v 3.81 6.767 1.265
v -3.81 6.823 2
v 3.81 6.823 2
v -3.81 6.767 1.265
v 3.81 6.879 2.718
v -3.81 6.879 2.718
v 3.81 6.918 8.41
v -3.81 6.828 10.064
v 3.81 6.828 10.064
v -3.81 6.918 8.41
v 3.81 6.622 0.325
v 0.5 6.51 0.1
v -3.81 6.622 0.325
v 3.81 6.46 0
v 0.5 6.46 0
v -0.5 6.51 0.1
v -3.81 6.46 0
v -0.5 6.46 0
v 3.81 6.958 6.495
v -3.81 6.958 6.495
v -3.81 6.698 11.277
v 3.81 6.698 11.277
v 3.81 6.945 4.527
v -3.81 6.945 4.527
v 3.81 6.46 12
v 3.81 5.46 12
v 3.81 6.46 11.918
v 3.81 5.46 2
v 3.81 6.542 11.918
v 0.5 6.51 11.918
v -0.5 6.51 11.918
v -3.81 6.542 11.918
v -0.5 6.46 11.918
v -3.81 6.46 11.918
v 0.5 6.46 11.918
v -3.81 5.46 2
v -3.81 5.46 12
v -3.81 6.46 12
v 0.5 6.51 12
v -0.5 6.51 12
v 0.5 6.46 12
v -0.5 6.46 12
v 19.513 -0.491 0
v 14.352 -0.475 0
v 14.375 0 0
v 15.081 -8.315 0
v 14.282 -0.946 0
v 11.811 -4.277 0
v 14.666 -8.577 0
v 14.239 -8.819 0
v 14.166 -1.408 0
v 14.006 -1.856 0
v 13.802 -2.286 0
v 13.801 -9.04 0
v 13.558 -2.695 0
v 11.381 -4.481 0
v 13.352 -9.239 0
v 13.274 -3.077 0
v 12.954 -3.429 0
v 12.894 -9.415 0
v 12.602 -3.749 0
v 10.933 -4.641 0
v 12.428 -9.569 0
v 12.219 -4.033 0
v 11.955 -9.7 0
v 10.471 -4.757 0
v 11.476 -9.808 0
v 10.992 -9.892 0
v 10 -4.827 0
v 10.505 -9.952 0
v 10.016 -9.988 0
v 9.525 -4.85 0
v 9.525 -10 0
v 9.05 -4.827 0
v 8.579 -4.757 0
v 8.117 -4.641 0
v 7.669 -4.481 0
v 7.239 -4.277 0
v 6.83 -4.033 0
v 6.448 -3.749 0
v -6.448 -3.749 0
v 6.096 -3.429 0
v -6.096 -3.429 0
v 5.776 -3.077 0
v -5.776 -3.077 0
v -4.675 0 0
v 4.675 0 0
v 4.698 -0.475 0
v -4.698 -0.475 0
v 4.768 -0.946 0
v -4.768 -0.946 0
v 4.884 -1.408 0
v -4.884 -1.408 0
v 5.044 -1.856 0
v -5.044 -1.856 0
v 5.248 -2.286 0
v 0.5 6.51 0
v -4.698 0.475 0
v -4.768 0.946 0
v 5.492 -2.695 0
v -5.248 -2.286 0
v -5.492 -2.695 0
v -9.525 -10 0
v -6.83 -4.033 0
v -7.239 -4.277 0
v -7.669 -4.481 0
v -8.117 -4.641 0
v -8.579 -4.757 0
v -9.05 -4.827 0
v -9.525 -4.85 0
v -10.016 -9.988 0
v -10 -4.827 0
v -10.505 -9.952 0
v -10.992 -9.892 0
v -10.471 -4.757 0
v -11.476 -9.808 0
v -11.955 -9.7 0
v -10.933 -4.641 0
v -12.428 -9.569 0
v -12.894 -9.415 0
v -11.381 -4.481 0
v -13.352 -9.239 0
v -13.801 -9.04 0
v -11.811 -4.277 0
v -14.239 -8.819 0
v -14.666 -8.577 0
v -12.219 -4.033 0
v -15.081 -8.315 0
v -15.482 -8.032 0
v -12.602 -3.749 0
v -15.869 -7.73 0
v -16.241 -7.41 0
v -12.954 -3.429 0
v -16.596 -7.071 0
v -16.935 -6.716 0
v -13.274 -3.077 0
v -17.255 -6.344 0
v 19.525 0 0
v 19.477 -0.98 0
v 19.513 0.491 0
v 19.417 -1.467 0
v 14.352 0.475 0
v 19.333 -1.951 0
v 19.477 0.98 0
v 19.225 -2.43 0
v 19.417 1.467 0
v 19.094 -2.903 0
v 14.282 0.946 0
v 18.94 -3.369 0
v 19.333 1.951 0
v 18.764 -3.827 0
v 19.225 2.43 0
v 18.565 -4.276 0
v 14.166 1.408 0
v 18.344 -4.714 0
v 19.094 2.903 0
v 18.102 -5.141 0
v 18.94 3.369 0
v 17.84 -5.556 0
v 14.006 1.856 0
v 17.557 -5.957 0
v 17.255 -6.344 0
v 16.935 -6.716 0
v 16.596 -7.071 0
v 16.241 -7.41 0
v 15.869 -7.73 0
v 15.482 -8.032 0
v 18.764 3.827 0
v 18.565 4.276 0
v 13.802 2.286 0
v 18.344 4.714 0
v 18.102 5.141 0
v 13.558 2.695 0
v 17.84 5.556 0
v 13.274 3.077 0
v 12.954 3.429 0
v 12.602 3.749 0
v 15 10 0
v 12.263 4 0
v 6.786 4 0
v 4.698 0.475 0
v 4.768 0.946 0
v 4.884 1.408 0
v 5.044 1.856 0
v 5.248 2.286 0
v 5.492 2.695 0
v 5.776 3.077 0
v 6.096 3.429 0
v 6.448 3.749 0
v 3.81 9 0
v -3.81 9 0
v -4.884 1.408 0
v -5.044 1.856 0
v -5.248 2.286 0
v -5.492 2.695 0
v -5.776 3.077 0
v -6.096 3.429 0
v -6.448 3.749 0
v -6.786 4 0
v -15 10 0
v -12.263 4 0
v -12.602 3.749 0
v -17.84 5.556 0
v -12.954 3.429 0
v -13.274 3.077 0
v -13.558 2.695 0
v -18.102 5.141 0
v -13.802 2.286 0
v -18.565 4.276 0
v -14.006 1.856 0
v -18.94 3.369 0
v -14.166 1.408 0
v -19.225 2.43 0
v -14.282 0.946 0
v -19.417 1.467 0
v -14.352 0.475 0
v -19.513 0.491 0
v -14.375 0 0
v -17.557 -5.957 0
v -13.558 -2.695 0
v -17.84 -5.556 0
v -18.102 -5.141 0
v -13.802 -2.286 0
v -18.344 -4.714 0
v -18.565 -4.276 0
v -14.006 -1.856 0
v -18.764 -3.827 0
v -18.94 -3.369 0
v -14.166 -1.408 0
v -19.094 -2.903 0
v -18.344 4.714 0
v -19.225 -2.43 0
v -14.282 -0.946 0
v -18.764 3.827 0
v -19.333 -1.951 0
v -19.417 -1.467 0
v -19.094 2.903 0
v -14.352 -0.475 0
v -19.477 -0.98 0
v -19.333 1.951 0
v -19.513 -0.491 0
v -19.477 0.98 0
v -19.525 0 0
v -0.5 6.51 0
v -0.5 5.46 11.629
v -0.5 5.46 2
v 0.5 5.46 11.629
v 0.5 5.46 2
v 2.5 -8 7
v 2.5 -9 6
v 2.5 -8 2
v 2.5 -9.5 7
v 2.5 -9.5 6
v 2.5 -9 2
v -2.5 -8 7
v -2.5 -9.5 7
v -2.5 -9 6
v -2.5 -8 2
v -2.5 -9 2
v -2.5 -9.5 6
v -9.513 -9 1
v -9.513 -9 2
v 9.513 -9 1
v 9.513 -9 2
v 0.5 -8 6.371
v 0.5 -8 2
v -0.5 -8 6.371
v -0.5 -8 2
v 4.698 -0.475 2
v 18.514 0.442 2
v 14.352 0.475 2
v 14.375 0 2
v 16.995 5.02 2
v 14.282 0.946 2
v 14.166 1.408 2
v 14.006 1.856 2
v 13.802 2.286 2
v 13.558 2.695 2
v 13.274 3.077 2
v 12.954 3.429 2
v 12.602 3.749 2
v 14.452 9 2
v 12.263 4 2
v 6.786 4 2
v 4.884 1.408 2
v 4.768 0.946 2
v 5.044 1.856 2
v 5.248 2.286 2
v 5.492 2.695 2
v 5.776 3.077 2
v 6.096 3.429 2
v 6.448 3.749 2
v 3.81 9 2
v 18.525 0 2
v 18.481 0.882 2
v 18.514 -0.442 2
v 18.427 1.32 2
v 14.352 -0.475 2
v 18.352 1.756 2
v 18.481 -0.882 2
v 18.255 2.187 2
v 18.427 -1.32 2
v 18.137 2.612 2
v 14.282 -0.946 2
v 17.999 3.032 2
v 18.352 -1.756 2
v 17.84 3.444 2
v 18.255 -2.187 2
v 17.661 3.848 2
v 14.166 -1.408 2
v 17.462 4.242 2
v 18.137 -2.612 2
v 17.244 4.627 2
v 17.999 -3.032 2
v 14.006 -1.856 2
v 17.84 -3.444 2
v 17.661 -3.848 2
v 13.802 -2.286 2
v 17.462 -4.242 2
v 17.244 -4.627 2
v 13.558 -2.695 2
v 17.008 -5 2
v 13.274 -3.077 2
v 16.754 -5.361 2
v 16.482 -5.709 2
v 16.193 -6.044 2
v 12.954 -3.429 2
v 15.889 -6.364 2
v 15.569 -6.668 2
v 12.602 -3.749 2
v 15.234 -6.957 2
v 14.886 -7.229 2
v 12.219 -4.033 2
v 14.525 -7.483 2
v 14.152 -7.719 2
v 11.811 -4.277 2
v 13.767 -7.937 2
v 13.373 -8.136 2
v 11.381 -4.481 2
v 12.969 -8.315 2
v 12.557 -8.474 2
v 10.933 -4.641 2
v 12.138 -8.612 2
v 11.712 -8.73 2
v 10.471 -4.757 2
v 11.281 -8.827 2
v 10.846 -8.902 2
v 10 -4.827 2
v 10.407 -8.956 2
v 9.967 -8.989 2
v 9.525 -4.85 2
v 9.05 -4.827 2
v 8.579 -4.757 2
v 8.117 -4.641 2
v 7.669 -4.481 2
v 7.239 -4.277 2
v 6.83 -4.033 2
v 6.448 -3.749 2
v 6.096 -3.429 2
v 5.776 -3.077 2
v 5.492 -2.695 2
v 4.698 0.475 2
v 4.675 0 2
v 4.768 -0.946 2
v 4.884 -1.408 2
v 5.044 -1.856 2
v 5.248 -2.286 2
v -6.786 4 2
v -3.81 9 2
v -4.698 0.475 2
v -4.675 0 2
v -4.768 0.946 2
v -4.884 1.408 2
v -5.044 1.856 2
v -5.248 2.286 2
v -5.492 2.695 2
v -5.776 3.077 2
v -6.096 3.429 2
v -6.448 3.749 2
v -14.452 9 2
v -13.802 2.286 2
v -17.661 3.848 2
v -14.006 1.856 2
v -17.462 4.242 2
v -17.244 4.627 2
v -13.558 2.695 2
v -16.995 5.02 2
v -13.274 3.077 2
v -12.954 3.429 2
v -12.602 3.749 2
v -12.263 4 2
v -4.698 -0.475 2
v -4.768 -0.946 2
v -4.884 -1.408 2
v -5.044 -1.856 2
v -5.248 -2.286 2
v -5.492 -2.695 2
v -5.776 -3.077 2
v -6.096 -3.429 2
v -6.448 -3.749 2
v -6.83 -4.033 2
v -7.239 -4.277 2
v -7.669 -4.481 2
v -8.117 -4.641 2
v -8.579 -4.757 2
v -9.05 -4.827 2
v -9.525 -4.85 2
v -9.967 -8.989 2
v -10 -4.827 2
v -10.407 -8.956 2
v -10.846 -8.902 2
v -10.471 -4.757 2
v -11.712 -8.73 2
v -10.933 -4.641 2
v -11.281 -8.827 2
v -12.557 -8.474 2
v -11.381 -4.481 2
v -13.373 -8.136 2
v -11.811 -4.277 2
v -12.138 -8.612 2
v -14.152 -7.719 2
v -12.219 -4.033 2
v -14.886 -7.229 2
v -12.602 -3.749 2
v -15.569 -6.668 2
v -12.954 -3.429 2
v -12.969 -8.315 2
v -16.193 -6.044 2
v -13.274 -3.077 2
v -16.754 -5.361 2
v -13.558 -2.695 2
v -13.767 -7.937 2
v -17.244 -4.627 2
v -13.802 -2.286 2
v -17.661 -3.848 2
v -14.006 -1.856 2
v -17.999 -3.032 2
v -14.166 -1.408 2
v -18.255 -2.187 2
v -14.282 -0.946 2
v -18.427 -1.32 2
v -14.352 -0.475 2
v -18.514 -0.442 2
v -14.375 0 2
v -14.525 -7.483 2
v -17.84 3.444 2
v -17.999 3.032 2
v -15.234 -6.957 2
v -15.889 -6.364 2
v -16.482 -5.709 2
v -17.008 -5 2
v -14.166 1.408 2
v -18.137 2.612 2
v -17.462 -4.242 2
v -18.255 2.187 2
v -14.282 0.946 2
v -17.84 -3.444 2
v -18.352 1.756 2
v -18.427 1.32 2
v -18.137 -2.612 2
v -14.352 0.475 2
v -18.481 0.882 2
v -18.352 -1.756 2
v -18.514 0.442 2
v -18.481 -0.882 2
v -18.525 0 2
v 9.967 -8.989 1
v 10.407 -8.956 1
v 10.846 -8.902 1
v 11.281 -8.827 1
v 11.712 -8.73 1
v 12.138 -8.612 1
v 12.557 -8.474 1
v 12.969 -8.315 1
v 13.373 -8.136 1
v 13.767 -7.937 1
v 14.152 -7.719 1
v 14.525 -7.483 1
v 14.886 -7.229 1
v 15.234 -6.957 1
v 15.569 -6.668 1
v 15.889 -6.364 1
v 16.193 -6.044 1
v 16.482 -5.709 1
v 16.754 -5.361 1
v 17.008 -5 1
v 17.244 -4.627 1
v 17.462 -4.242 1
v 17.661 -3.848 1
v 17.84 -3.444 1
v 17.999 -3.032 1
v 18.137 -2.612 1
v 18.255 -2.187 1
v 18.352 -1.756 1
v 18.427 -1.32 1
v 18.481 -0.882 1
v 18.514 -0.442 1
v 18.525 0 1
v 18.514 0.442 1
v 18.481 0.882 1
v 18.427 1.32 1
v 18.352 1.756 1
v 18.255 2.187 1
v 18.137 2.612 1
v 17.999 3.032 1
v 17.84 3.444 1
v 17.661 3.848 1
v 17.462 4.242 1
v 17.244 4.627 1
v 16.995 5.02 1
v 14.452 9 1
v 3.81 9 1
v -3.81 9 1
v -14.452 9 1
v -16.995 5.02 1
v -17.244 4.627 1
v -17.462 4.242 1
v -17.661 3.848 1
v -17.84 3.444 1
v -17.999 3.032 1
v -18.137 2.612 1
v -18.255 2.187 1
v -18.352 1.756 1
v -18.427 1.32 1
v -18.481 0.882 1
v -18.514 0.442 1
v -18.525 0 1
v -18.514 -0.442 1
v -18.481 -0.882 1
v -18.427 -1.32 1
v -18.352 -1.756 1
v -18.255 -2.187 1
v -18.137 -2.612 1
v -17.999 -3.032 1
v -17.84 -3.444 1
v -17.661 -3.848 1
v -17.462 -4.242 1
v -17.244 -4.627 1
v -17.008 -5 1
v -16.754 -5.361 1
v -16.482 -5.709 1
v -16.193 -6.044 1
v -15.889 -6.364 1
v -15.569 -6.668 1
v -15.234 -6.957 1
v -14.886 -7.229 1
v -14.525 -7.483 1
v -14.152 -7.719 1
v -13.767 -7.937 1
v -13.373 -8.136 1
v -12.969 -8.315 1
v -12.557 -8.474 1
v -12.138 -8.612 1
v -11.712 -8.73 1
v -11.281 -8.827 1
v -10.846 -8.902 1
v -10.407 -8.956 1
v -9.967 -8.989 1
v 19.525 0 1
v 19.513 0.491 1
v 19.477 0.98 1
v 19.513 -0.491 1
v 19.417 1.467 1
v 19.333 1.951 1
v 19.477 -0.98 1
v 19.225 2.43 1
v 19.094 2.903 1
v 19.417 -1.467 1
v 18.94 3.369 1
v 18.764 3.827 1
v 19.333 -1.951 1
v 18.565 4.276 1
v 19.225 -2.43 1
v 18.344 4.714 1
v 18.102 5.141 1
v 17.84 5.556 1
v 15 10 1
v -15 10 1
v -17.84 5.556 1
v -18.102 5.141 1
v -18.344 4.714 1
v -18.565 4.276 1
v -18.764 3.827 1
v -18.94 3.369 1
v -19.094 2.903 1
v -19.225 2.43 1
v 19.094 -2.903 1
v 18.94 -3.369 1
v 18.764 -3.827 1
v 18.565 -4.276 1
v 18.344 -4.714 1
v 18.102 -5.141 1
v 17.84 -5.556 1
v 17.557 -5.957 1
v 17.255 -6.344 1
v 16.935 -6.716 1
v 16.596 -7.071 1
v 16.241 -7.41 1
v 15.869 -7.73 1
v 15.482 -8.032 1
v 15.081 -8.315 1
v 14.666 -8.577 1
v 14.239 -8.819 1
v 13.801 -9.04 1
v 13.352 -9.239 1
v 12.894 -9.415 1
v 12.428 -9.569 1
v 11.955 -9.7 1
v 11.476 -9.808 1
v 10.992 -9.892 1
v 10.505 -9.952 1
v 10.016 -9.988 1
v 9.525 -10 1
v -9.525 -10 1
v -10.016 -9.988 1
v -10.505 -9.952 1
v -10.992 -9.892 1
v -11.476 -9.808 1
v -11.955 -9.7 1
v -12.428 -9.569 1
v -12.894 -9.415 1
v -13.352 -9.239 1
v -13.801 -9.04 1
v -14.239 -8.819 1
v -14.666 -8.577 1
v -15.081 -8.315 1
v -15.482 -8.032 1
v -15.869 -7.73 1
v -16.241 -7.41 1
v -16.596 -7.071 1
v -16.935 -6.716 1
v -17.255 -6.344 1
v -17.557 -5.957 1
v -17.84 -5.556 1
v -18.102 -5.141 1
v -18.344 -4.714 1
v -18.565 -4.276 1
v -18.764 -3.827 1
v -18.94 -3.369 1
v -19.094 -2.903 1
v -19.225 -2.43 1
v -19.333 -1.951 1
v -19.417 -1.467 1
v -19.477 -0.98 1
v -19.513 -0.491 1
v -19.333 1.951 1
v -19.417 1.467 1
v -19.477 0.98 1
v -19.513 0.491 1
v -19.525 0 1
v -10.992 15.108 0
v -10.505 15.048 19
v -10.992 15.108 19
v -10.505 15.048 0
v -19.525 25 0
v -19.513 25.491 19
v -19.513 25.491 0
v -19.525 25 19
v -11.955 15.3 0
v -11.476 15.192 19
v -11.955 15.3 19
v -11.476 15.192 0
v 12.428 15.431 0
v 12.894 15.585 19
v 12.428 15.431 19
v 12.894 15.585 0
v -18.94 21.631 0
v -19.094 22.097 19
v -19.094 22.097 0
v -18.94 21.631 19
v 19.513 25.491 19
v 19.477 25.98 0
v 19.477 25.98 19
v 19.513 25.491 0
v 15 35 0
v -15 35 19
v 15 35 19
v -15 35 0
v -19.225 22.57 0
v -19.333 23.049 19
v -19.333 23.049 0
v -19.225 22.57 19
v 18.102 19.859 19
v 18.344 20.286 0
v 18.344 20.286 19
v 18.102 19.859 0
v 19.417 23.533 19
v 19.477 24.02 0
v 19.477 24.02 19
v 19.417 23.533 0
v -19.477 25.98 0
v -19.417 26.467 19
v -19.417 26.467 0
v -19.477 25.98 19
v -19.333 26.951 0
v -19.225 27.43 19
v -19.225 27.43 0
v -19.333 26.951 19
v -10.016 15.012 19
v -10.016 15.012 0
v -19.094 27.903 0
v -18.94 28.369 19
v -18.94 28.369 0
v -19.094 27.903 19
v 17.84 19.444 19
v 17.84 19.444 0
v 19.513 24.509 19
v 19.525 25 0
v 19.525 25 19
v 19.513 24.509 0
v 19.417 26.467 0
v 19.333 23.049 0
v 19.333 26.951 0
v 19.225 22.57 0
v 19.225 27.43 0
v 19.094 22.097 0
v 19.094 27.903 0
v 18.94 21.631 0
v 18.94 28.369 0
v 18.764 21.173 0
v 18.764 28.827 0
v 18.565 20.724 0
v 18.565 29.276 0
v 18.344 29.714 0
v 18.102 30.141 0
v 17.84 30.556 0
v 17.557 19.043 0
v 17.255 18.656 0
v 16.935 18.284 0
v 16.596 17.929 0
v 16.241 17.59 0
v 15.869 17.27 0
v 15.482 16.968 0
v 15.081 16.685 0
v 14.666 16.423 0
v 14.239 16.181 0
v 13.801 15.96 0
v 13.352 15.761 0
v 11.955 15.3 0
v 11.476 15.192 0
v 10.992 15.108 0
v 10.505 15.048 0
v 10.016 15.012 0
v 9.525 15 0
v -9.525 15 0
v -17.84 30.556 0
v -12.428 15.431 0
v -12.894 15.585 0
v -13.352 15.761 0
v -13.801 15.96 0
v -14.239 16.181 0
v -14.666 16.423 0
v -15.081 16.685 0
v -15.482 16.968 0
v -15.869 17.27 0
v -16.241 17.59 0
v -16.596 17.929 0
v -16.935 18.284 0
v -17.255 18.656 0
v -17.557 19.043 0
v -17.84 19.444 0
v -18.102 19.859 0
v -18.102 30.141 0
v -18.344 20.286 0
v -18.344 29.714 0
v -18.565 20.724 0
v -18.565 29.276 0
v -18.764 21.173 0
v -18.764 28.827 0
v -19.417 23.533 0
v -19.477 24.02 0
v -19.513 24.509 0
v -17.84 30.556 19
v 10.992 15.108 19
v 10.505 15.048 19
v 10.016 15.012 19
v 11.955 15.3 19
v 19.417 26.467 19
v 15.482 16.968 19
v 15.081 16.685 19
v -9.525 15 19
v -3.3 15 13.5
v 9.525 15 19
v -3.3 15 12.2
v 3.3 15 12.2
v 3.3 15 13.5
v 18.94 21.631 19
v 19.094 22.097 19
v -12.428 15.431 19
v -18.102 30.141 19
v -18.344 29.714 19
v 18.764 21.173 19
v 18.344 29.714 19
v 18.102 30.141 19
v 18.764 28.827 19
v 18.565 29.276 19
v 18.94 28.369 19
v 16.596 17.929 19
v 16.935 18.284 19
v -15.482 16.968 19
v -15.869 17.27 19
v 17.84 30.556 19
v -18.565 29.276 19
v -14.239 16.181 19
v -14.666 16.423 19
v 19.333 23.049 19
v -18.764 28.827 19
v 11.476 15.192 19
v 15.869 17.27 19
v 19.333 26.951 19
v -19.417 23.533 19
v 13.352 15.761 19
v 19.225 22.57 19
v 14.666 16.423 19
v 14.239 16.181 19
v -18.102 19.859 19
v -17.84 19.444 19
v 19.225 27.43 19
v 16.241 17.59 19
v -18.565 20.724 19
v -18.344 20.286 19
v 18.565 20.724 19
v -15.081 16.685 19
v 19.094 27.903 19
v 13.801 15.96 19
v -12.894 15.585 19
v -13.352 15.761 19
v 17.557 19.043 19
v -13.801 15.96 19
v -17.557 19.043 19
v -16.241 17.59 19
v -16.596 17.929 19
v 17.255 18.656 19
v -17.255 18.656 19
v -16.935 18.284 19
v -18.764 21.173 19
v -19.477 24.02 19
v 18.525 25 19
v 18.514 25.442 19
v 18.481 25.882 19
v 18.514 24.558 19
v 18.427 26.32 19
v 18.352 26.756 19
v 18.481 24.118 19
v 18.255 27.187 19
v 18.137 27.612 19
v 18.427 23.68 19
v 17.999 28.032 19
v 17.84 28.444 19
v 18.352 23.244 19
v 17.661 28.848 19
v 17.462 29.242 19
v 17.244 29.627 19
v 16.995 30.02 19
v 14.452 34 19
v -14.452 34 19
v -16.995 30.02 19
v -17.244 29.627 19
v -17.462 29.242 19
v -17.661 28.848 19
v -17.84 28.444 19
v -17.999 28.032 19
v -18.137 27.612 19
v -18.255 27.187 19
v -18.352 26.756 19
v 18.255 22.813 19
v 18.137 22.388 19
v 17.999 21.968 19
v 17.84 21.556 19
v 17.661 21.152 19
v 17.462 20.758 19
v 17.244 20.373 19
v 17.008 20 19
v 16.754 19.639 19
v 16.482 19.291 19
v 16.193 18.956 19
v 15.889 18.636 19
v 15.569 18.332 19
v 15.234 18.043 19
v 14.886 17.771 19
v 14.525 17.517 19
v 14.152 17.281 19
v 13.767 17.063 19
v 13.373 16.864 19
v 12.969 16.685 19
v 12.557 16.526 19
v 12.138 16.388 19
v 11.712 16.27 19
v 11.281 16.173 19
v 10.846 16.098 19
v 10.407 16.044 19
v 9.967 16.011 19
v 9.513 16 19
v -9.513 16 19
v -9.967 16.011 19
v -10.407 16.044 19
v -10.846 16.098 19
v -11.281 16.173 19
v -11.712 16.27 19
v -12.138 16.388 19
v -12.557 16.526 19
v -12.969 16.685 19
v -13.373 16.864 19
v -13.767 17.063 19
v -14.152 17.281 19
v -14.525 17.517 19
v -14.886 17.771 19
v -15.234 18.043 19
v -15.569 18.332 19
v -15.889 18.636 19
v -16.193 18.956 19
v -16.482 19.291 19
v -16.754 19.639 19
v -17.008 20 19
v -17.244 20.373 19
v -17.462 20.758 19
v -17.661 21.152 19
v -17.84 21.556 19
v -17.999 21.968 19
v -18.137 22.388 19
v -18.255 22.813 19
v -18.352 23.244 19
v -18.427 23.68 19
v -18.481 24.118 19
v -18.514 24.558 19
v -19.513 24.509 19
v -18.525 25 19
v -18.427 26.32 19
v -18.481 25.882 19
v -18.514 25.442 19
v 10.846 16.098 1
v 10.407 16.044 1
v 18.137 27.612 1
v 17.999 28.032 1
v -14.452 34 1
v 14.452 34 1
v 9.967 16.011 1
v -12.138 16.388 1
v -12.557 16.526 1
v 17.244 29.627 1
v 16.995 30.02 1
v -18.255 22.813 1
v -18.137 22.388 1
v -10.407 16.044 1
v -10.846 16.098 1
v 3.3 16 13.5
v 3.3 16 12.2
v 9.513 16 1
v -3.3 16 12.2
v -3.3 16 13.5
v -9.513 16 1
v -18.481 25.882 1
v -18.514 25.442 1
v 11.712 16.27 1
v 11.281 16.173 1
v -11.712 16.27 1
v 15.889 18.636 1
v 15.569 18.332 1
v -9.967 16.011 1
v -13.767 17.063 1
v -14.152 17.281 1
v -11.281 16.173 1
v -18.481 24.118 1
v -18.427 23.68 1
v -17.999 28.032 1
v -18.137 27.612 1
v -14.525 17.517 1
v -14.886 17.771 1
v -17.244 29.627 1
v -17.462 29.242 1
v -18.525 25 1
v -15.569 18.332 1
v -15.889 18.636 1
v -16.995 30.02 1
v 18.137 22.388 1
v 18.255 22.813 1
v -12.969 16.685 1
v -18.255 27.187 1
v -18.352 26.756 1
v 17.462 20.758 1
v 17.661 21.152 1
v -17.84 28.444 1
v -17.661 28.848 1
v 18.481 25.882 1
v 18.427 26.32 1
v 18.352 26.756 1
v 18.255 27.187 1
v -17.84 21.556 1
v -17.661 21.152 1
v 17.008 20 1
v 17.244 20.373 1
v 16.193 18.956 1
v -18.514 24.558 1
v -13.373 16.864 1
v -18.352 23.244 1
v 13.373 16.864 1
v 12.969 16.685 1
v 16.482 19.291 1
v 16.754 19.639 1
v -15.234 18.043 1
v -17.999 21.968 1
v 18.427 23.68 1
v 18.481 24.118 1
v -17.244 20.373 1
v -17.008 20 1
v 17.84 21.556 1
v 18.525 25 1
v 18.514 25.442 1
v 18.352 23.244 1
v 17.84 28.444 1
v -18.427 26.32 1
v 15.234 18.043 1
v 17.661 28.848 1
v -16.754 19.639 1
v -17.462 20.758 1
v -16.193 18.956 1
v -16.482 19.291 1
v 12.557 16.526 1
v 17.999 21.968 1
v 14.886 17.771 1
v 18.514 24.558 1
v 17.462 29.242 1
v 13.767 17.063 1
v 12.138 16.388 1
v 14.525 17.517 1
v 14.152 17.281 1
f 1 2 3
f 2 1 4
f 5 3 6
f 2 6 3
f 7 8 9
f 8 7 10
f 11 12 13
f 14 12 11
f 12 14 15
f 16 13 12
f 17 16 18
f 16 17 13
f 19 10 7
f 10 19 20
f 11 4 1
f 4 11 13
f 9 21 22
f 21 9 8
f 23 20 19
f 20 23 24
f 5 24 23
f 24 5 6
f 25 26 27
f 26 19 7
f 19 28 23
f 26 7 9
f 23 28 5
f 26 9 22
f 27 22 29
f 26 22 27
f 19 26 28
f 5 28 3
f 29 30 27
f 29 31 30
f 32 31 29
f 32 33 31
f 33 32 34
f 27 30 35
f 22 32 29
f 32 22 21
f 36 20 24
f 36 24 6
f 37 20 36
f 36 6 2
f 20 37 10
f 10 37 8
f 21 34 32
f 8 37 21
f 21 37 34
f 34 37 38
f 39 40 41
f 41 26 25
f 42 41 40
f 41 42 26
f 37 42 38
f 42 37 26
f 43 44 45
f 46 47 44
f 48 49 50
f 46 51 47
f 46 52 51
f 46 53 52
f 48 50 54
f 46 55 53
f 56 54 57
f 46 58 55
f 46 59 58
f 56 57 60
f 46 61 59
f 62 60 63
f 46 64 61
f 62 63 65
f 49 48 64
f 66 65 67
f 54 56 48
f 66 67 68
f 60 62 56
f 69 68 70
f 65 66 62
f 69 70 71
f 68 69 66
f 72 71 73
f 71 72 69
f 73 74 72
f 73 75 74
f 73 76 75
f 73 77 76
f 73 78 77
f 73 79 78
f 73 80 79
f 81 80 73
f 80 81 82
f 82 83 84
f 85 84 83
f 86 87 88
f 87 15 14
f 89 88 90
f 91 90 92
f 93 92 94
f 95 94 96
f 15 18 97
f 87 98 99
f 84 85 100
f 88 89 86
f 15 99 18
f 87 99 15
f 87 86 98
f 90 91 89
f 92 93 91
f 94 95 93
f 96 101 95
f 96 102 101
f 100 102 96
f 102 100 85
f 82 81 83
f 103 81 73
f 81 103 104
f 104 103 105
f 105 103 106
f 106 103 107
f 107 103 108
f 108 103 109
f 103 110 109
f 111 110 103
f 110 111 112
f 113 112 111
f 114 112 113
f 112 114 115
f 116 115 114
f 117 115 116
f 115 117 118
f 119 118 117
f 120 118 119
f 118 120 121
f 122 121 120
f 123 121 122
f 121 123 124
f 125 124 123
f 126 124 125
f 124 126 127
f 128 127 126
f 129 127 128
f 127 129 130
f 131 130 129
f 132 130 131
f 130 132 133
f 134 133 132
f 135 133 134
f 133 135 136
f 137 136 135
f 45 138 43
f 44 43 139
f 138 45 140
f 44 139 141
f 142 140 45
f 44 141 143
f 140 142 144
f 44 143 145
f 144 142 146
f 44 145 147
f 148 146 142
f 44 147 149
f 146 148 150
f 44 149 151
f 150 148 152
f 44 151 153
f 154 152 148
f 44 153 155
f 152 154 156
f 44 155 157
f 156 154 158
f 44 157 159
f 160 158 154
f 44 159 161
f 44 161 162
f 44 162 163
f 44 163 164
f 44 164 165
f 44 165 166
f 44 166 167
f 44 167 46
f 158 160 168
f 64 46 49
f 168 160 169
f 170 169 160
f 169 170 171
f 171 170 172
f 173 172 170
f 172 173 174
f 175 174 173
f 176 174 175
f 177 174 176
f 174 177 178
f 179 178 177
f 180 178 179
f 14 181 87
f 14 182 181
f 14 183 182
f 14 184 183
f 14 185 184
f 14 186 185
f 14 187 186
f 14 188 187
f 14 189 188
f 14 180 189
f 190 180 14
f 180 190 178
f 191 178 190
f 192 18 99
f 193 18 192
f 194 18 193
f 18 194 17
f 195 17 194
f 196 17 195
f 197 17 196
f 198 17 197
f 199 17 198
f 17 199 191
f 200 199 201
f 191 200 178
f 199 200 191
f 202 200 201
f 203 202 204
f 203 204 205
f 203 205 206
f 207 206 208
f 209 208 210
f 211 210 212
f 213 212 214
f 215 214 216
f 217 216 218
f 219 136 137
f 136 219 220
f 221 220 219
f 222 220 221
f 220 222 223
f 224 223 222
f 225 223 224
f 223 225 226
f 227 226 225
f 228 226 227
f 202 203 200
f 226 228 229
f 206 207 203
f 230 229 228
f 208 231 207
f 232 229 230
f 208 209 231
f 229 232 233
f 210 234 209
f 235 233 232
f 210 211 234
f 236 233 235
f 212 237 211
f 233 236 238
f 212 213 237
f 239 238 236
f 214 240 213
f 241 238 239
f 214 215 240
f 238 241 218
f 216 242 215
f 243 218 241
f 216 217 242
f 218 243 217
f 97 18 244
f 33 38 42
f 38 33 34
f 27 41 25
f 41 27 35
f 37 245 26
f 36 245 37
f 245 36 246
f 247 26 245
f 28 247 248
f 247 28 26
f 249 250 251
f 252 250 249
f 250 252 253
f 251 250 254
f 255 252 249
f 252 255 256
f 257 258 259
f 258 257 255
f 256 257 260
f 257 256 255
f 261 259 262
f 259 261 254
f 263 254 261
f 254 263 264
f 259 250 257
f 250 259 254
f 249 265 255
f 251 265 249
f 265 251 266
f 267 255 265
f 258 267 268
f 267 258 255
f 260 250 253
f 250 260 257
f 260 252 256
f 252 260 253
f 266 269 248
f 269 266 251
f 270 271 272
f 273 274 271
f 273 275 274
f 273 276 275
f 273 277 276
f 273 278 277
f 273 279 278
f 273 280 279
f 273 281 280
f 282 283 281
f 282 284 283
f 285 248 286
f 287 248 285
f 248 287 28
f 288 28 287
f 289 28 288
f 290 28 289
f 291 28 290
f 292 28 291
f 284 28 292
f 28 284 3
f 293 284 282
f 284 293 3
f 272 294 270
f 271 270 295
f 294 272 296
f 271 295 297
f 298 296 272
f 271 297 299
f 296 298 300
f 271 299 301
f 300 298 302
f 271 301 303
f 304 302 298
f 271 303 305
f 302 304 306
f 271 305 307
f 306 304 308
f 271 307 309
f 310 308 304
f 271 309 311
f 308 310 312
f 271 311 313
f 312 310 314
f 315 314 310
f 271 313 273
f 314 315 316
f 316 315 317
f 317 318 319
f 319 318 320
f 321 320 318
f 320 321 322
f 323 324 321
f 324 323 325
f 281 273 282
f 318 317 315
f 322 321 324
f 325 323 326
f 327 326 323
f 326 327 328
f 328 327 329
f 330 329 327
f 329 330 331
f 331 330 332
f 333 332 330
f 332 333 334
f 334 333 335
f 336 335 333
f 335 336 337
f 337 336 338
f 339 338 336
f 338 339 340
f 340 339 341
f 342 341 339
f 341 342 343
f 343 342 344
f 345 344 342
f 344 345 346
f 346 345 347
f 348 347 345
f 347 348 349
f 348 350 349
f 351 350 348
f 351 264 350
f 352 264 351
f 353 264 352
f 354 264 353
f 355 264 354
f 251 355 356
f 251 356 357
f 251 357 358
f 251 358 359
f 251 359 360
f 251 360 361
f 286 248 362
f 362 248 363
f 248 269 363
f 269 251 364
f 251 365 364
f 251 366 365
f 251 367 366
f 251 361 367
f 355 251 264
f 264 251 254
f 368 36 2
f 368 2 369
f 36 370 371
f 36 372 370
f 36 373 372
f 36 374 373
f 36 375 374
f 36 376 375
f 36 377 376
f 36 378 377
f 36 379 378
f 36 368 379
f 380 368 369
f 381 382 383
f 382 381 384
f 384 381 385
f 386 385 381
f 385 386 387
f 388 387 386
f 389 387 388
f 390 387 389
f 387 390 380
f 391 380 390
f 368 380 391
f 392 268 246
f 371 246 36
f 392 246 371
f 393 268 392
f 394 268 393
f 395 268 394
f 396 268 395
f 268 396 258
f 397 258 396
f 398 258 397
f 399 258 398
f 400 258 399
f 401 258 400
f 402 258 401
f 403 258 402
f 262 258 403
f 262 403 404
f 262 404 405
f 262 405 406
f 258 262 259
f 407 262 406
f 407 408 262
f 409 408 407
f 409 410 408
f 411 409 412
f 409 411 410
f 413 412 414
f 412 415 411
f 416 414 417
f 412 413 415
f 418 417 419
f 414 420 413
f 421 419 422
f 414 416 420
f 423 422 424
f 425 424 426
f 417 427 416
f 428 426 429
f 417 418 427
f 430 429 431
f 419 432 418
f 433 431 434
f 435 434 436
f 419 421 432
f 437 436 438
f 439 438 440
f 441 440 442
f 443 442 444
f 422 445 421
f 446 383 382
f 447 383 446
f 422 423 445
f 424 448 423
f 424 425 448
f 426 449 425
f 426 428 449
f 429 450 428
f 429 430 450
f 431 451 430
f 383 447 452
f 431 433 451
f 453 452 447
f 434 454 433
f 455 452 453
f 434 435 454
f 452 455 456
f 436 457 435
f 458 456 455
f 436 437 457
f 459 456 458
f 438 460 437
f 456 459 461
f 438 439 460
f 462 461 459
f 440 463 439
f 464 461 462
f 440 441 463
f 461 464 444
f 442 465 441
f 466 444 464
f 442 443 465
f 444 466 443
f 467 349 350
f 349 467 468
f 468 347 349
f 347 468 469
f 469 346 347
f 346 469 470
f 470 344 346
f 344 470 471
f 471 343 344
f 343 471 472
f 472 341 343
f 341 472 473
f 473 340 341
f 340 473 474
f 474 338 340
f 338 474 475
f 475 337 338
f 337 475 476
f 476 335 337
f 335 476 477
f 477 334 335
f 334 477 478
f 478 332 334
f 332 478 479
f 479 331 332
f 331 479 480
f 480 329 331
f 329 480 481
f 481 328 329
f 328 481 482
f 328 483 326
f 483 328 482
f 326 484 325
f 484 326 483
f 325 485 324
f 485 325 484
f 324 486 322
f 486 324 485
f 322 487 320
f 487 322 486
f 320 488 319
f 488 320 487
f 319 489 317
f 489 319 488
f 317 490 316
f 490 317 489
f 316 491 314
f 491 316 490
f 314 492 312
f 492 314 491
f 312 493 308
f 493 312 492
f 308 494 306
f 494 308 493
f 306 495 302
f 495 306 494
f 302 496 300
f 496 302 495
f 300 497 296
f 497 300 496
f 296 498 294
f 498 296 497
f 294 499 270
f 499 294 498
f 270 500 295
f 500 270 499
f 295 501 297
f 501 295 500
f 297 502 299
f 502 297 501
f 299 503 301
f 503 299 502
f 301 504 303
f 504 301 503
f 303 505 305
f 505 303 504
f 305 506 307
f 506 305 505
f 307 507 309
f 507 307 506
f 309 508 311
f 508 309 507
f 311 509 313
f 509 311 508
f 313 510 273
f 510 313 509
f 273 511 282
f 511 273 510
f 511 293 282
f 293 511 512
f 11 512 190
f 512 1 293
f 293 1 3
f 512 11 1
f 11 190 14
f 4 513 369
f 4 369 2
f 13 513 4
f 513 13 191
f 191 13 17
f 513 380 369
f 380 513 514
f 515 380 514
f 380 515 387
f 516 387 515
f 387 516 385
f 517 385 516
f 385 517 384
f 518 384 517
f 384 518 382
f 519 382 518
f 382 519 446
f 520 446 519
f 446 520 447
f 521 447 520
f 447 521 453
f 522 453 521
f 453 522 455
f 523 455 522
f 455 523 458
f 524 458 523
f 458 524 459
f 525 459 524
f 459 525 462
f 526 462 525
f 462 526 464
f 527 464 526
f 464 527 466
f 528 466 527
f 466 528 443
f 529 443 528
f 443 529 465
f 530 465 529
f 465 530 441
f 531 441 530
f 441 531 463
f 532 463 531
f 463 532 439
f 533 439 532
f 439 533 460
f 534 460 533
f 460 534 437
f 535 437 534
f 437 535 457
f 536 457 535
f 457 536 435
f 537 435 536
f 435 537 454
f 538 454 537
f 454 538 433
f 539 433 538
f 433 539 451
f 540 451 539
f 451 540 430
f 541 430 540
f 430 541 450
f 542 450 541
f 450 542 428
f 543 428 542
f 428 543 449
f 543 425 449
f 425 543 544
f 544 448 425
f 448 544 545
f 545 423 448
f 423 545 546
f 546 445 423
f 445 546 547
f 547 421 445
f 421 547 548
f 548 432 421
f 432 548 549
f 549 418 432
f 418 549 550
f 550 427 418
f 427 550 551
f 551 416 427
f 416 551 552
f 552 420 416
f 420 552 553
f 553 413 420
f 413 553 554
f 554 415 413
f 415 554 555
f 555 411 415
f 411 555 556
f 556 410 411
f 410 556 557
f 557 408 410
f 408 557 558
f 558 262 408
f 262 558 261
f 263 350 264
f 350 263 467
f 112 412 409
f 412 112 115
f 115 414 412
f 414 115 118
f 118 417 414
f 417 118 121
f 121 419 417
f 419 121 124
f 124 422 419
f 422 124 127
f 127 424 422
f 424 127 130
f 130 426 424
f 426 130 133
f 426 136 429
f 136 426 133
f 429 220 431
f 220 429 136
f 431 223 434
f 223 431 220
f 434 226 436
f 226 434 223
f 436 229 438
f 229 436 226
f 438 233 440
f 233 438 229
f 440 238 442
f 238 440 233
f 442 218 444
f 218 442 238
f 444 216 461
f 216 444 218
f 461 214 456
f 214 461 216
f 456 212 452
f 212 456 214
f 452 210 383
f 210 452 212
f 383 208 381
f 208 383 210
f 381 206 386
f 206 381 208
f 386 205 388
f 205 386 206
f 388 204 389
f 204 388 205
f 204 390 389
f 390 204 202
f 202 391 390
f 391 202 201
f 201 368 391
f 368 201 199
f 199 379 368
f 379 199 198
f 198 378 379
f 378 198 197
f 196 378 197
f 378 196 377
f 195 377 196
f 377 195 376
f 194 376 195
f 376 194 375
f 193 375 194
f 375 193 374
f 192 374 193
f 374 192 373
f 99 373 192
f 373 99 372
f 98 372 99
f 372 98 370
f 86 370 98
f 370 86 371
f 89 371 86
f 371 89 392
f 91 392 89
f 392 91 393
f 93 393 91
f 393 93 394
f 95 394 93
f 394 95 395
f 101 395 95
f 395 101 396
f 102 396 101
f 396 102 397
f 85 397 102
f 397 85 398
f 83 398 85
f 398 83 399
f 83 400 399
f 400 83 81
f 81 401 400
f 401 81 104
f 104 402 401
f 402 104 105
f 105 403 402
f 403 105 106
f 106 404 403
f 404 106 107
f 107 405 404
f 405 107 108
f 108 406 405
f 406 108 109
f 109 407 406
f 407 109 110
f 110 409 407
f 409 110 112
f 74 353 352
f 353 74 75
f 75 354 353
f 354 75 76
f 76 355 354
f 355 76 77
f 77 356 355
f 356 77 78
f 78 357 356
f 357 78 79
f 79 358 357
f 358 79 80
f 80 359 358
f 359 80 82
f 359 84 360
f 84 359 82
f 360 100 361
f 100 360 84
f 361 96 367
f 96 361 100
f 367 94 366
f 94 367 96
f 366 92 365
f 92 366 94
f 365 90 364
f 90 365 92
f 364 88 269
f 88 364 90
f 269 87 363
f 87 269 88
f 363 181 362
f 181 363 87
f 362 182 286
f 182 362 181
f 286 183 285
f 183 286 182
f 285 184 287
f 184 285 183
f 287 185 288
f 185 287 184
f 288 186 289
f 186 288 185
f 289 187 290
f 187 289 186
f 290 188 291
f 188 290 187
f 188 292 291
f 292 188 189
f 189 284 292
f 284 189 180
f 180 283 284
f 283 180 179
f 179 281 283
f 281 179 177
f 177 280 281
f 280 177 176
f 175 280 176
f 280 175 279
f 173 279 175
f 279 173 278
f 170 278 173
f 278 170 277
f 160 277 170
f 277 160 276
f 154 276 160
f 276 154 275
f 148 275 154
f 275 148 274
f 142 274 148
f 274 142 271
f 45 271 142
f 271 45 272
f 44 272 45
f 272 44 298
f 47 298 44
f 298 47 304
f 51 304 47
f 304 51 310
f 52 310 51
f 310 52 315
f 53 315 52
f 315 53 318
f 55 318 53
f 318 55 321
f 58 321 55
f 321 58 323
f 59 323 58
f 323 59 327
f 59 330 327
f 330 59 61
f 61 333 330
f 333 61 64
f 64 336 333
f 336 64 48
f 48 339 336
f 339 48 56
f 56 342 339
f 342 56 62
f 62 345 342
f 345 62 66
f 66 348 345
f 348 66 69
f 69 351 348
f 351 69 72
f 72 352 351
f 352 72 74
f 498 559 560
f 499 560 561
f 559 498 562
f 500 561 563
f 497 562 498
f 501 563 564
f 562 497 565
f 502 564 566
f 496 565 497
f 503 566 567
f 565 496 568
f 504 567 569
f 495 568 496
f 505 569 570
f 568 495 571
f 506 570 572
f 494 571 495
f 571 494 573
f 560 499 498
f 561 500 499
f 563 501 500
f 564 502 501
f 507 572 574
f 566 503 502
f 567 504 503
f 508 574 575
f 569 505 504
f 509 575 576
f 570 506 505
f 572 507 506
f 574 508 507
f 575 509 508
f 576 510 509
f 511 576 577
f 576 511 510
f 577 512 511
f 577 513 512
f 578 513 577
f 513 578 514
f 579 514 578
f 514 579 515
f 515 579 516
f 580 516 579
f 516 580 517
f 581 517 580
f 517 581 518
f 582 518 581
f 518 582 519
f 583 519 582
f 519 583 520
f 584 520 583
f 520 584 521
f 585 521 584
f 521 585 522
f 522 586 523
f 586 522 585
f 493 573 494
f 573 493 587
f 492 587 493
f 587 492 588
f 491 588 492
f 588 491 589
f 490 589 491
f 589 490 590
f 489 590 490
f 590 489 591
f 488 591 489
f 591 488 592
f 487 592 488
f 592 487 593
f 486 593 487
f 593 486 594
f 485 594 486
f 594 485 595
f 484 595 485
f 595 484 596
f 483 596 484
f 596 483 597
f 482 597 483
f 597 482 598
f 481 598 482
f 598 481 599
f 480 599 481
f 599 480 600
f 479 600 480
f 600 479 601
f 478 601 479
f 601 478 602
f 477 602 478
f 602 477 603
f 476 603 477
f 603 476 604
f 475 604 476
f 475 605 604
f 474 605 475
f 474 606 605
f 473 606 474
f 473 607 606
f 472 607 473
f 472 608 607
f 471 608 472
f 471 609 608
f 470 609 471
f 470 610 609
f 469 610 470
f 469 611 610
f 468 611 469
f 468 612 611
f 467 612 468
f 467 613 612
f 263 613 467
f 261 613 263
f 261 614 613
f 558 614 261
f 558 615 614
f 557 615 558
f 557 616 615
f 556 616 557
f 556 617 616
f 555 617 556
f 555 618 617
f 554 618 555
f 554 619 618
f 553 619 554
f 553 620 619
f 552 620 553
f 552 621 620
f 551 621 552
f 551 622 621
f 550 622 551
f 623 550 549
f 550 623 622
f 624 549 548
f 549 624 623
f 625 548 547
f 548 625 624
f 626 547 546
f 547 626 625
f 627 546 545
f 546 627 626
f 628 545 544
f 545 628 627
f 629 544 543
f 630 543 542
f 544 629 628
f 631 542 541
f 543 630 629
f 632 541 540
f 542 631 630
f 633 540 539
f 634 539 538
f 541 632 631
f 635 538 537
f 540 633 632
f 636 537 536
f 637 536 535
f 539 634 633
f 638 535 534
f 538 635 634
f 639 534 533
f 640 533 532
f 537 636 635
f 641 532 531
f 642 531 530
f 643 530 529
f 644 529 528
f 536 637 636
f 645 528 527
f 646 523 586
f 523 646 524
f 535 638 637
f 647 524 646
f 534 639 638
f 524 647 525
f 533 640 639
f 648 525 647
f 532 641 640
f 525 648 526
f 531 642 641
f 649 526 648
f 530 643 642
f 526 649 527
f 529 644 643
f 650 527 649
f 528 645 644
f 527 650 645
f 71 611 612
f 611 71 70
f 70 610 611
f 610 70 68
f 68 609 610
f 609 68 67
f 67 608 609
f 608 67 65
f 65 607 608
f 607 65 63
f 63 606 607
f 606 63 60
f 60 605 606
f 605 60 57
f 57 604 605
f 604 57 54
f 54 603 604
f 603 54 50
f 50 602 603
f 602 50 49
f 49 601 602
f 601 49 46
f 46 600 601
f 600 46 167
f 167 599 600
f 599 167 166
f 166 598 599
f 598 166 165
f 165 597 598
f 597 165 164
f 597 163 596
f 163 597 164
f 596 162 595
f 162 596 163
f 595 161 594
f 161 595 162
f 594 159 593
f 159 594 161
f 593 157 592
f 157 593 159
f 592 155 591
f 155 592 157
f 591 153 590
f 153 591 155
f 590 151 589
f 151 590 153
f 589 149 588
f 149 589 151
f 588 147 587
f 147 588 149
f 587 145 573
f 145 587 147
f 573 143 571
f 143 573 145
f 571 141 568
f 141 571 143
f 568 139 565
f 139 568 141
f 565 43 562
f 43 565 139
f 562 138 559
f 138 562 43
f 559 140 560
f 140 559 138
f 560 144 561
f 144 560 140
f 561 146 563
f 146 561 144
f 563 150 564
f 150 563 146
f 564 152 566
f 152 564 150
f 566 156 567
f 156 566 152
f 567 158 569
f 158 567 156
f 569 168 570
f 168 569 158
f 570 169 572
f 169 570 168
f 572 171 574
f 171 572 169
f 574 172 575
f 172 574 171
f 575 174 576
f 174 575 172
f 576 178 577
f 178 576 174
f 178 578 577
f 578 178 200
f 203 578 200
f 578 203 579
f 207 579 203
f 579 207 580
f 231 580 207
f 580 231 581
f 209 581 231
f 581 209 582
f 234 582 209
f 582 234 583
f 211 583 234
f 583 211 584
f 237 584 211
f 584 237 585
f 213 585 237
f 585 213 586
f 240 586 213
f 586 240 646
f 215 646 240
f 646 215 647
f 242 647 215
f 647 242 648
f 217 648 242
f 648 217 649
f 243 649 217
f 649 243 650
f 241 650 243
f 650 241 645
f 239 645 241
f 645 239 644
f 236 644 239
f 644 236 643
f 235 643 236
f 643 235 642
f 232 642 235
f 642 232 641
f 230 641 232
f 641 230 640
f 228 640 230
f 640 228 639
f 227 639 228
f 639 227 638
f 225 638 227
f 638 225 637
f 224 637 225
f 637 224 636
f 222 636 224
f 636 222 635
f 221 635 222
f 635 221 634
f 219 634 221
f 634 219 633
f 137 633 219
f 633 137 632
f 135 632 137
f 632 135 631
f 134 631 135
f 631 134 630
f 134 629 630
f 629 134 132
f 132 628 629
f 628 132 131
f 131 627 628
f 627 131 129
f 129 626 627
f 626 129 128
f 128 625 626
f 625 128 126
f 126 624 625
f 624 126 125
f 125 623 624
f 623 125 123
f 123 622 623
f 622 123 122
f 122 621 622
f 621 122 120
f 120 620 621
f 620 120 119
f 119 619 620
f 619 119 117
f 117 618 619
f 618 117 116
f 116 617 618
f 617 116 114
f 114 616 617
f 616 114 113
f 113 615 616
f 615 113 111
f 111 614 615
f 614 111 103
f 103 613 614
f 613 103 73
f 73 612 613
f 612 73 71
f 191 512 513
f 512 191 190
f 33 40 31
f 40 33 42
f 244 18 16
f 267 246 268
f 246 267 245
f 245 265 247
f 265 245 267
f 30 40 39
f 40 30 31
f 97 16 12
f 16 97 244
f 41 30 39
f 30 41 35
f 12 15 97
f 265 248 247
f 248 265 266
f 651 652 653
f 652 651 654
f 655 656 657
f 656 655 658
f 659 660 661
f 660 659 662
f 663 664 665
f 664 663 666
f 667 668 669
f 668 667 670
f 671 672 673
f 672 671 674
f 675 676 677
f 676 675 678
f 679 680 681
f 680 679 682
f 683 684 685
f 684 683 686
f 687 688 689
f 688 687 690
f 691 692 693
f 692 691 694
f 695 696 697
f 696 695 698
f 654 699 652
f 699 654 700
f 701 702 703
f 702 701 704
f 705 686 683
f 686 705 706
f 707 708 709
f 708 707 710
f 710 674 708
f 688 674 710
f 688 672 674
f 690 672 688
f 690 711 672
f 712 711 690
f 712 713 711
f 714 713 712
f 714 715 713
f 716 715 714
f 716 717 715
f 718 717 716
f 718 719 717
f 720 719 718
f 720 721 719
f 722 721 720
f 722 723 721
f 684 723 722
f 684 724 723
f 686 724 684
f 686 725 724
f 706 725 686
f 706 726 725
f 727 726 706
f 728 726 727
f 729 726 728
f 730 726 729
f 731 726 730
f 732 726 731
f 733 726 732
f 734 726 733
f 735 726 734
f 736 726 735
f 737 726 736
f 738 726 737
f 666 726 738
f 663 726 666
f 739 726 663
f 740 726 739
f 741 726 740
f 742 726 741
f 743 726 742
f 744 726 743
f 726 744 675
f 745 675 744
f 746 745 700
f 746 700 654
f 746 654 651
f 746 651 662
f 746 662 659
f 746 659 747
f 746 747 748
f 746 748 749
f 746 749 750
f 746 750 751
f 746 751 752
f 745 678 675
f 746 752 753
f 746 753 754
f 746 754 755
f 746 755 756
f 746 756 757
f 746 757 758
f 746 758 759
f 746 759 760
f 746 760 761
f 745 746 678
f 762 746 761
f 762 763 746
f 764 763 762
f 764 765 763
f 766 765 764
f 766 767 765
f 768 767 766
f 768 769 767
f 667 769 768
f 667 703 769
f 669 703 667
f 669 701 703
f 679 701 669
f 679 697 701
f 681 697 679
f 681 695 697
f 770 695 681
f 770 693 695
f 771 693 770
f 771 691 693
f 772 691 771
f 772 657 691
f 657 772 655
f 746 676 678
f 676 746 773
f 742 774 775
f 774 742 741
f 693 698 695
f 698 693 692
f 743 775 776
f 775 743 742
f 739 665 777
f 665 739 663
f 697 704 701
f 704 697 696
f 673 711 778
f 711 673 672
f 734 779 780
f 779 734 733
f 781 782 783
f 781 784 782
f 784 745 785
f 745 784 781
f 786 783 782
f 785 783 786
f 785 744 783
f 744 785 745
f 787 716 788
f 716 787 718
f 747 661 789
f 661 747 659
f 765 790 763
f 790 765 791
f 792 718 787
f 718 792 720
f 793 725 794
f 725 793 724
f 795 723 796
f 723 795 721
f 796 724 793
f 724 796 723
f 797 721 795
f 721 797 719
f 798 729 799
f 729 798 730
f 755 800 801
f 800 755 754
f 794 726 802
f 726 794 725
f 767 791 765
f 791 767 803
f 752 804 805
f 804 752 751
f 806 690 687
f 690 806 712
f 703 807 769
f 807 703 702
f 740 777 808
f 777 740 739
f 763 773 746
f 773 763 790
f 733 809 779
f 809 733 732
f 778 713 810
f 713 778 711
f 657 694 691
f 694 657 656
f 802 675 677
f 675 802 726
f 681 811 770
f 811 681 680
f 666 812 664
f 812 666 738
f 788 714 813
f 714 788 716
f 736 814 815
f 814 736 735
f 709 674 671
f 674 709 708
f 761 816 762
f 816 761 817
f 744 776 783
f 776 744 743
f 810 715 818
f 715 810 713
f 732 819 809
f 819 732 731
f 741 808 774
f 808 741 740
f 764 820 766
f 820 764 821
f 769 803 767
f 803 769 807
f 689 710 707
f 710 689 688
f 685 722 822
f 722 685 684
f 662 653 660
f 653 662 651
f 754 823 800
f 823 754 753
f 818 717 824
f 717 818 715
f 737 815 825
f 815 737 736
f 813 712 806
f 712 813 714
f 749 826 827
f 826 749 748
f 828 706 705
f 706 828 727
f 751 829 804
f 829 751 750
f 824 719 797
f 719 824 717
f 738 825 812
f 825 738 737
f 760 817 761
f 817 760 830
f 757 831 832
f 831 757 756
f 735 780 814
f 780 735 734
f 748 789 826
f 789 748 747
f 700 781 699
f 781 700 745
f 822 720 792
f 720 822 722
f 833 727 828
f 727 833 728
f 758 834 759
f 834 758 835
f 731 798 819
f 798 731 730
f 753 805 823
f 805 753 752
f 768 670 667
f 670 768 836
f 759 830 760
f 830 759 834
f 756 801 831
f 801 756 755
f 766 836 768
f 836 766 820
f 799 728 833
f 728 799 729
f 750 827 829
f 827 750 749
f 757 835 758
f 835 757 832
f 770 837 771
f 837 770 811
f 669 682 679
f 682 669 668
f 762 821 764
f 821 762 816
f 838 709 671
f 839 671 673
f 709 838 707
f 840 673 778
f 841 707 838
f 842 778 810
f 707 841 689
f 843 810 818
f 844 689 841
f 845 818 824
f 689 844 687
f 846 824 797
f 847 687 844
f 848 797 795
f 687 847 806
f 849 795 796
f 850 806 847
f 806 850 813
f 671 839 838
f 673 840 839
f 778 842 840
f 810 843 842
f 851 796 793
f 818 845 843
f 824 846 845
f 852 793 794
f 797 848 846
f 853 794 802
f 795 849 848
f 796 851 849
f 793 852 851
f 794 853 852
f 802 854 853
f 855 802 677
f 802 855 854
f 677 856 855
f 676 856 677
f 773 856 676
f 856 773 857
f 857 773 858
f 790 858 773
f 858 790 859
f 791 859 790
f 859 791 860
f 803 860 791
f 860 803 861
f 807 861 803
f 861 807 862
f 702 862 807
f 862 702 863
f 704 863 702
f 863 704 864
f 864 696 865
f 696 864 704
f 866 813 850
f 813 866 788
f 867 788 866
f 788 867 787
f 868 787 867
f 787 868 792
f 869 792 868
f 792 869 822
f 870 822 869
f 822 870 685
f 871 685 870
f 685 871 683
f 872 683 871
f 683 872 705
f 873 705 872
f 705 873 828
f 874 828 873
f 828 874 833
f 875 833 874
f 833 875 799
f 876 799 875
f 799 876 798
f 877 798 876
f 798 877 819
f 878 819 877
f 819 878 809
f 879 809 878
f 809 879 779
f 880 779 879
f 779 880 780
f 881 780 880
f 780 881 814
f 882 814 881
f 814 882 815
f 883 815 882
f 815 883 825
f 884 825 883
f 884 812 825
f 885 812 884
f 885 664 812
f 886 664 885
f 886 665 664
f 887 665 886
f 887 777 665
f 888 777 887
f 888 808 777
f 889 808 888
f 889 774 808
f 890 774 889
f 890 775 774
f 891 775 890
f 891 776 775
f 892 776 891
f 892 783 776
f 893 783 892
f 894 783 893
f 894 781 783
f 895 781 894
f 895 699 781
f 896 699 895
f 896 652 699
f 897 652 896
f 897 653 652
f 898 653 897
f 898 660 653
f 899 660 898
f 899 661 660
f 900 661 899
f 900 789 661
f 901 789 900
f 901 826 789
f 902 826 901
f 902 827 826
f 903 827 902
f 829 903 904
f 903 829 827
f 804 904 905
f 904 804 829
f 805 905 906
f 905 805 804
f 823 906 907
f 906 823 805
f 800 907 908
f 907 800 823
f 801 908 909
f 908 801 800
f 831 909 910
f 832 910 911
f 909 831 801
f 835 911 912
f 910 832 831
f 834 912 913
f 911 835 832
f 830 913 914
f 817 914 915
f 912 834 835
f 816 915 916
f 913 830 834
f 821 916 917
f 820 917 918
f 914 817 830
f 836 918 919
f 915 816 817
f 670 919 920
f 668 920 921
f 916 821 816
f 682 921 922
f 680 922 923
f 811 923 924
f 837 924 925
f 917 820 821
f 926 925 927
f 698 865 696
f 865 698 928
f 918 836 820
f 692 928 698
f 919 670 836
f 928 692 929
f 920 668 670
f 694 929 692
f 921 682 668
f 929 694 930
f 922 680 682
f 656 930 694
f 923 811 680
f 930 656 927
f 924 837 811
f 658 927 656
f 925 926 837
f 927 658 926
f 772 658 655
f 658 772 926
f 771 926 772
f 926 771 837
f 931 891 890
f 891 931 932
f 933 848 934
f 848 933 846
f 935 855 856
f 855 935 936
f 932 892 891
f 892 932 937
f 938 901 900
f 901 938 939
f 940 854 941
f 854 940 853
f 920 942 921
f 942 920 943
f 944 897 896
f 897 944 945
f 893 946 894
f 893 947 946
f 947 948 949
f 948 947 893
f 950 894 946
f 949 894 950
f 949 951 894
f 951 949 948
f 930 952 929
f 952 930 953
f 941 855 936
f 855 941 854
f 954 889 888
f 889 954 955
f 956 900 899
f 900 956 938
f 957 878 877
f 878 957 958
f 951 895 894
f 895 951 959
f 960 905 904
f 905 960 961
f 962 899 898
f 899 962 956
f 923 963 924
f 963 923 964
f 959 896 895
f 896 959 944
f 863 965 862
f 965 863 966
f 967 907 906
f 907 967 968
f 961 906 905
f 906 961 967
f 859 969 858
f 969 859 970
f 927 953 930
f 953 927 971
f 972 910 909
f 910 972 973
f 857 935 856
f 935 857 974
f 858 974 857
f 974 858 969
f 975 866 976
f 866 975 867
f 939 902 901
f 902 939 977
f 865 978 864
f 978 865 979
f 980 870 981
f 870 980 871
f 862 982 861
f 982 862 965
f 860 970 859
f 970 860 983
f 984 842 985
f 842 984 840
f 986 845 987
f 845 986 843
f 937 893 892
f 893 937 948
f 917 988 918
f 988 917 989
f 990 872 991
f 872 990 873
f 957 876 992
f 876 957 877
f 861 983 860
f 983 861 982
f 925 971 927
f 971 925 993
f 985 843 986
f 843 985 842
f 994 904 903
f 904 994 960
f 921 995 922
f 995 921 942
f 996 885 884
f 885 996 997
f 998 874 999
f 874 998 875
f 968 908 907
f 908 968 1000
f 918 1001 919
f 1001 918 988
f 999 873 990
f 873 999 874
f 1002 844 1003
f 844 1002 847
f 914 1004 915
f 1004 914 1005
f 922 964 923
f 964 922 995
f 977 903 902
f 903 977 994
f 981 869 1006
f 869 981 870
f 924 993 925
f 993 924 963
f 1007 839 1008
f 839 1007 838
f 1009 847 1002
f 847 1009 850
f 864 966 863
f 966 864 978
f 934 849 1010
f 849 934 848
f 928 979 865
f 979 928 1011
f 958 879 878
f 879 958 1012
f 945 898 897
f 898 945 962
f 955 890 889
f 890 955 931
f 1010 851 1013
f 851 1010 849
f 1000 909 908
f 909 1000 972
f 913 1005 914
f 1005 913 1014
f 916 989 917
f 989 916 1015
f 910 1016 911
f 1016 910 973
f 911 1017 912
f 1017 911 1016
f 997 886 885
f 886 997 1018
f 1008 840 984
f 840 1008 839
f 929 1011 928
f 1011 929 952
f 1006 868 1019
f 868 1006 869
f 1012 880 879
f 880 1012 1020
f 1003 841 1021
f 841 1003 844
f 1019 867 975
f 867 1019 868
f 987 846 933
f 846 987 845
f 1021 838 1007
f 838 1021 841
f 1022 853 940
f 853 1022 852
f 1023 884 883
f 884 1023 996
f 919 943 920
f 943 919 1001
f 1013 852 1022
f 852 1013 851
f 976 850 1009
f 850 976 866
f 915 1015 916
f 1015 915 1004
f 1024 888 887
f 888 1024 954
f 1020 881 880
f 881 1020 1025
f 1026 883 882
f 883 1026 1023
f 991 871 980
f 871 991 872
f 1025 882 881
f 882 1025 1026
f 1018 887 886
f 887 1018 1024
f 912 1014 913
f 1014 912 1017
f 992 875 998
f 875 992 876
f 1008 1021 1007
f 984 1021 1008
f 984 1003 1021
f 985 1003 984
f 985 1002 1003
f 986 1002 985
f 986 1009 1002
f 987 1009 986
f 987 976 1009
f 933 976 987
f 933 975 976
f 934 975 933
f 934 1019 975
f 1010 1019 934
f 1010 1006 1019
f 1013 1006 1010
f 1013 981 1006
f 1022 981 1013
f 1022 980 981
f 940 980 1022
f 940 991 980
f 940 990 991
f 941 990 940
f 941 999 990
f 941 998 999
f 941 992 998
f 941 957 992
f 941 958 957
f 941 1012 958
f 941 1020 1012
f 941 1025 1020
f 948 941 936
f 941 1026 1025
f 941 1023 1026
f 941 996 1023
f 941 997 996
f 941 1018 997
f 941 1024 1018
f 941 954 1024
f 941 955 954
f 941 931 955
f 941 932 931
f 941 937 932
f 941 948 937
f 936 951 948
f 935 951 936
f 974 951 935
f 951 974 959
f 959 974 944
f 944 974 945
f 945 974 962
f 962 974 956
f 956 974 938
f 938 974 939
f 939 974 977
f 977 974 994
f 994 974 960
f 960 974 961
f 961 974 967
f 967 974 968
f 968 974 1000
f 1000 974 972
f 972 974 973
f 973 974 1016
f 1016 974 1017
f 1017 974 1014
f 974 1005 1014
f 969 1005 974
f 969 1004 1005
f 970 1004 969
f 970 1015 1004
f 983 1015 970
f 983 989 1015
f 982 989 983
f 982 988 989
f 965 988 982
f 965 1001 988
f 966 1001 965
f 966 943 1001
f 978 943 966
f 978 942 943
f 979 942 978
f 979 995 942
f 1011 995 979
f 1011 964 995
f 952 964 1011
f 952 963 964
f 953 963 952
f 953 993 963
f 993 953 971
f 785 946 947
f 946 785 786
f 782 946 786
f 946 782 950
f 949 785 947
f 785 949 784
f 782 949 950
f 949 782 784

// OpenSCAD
bnc_spacing = 0.75 * 25.4;  // traditional binding post spacing seems like a good choice
// need at least 7 mm of clearance radius for hardware
bnc_clearance_radius = 8;
bnc_depth = 18;
wall_thickness = 1;
panel_thickness = 2;
panel_rabbet = 1;
box_radius = bnc_clearance_radius + wall_thickness * 2;
box_flat_side = 30;
box_inner_edge = box_radius - wall_thickness;

cable_pitch = 0.1 * 25.4;  // std ribbon cable
cable_width = cable_pitch * 3;
cable_thickness = cable_pitch;
cable_retainer_height = 12;
cable_retainer_bump = 1;

snap_width = 5;
snap_ysize = 0.5;
snap_zsize = 1.0;
snap_z_from_panel_base = 6;
snap_z_from_shell_end = snap_z_from_panel_base - (panel_thickness - panel_rabbet);

epsilon = 0.1;

panel();
translate([0, box_radius * 2.5]) shell();

module panel() {
    cable_hole_outer_edge = box_inner_edge;
    cable_hole_inner_edge = cable_hole_outer_edge - cable_thickness;

    linear_extrude(panel_thickness)
    difference() {
        box_inner_2d();        
        negatives();
    }
    
    linear_extrude(panel_thickness - panel_rabbet)
    difference() {
        box_2d();        
        negatives();
    }
    
    // cable retainer
    translate([0, cable_hole_inner_edge, cable_retainer_height / 2]) {
        scale([1, cable_retainer_bump / cable_retainer_height, 1])
        rotate([0, 90, 0])
        cylinder(d=cable_retainer_height, h=cable_width, center=true);
        
        translate([0, -1/2, 0])
        cube([cable_width, 1, cable_retainer_height], center=true);
    }
    
    // locking snap
    mirror([0, 1, 0]) {
        support_thickness = 1;
        // base / printing support
        translate([-snap_width / 2, box_inner_edge - support_thickness, 0])
        cube([snap_width, support_thickness, snap_z_from_panel_base + snap_zsize]);
        
        // actual snap
        translate([-snap_width / 2, box_inner_edge, snap_z_from_panel_base])
        cube([snap_width, snap_ysize, snap_zsize]);
    }
    
    hull() {
        translate([0, cable_hole_inner_edge, cable_retainer_height / 2])
        cube([wall_thickness, epsilon, cable_retainer_height], center=true);

        translate([0, -box_inner_edge + epsilon, snap_z_from_panel_base / 2])
        cube([wall_thickness, epsilon, snap_z_from_panel_base], center=true);
    }

    module negatives() {
        translate([-bnc_spacing / 2, 0])
        bnc_hole_2d();
        
        translate([bnc_spacing / 2, 0])
        bnc_hole_2d();

        translate([0, (cable_hole_outer_edge + cable_hole_inner_edge) / 2])
        square([cable_width, cable_thickness], center=true);
    }
}

module shell() {
    shell_height = bnc_depth + wall_thickness;
    snap_clearance_x = 0.8;
    snap_clearance_z = 0.3;
    
    difference() {
        linear_extrude(shell_height)
        box_2d();

        translate([0, 0, wall_thickness])
        linear_extrude(shell_height - wall_thickness + epsilon)
        box_inner_2d();
        
        translate([
            -(snap_width / 2 + snap_clearance_x),
            -box_radius - epsilon,
            shell_height - snap_z_from_shell_end - (snap_zsize + snap_clearance_x)])
        cube([snap_width + snap_clearance_x * 2, wall_thickness + epsilon * 2, snap_zsize + snap_clearance_z]);
    }
}

module box_inner_2d() {
    offset(r=-wall_thickness)
    box_2d();
}

module box_2d() {
    // square([bnc_spacing + bnc_clearance_radius * 2, bnc_clearance_radius * 2], center=true);
    
    hull() {
        bnc_positions()
        circle(r=box_radius, $fn = 128);
                
        translate([-box_flat_side / 2, 0])
        square([box_flat_side, box_radius]);
    }
}

module bnc_positions() {
    translate([-bnc_spacing / 2, 0]) children();
    translate([bnc_spacing / 2, 0]) children();
}

module bnc_hole_2d() {
    // Dimensions per https://www.amphenolrf.com/downloads/dl/file/id/1010/product/459/031_221_rfx_customer_drawing.pdf
    diameter = 9.7;
    flat_diameter = 8.85;
    intersection() {
        circle(d=diameter, $fn=64);
        translate([0, (flat_diameter - diameter) / 2])
        square([diameter, flat_diameter], center=true);
    }

    *%cylinder(r=bnc_clearance_radius, h=bnc_depth * 2, center=true, $fn=64);
}
